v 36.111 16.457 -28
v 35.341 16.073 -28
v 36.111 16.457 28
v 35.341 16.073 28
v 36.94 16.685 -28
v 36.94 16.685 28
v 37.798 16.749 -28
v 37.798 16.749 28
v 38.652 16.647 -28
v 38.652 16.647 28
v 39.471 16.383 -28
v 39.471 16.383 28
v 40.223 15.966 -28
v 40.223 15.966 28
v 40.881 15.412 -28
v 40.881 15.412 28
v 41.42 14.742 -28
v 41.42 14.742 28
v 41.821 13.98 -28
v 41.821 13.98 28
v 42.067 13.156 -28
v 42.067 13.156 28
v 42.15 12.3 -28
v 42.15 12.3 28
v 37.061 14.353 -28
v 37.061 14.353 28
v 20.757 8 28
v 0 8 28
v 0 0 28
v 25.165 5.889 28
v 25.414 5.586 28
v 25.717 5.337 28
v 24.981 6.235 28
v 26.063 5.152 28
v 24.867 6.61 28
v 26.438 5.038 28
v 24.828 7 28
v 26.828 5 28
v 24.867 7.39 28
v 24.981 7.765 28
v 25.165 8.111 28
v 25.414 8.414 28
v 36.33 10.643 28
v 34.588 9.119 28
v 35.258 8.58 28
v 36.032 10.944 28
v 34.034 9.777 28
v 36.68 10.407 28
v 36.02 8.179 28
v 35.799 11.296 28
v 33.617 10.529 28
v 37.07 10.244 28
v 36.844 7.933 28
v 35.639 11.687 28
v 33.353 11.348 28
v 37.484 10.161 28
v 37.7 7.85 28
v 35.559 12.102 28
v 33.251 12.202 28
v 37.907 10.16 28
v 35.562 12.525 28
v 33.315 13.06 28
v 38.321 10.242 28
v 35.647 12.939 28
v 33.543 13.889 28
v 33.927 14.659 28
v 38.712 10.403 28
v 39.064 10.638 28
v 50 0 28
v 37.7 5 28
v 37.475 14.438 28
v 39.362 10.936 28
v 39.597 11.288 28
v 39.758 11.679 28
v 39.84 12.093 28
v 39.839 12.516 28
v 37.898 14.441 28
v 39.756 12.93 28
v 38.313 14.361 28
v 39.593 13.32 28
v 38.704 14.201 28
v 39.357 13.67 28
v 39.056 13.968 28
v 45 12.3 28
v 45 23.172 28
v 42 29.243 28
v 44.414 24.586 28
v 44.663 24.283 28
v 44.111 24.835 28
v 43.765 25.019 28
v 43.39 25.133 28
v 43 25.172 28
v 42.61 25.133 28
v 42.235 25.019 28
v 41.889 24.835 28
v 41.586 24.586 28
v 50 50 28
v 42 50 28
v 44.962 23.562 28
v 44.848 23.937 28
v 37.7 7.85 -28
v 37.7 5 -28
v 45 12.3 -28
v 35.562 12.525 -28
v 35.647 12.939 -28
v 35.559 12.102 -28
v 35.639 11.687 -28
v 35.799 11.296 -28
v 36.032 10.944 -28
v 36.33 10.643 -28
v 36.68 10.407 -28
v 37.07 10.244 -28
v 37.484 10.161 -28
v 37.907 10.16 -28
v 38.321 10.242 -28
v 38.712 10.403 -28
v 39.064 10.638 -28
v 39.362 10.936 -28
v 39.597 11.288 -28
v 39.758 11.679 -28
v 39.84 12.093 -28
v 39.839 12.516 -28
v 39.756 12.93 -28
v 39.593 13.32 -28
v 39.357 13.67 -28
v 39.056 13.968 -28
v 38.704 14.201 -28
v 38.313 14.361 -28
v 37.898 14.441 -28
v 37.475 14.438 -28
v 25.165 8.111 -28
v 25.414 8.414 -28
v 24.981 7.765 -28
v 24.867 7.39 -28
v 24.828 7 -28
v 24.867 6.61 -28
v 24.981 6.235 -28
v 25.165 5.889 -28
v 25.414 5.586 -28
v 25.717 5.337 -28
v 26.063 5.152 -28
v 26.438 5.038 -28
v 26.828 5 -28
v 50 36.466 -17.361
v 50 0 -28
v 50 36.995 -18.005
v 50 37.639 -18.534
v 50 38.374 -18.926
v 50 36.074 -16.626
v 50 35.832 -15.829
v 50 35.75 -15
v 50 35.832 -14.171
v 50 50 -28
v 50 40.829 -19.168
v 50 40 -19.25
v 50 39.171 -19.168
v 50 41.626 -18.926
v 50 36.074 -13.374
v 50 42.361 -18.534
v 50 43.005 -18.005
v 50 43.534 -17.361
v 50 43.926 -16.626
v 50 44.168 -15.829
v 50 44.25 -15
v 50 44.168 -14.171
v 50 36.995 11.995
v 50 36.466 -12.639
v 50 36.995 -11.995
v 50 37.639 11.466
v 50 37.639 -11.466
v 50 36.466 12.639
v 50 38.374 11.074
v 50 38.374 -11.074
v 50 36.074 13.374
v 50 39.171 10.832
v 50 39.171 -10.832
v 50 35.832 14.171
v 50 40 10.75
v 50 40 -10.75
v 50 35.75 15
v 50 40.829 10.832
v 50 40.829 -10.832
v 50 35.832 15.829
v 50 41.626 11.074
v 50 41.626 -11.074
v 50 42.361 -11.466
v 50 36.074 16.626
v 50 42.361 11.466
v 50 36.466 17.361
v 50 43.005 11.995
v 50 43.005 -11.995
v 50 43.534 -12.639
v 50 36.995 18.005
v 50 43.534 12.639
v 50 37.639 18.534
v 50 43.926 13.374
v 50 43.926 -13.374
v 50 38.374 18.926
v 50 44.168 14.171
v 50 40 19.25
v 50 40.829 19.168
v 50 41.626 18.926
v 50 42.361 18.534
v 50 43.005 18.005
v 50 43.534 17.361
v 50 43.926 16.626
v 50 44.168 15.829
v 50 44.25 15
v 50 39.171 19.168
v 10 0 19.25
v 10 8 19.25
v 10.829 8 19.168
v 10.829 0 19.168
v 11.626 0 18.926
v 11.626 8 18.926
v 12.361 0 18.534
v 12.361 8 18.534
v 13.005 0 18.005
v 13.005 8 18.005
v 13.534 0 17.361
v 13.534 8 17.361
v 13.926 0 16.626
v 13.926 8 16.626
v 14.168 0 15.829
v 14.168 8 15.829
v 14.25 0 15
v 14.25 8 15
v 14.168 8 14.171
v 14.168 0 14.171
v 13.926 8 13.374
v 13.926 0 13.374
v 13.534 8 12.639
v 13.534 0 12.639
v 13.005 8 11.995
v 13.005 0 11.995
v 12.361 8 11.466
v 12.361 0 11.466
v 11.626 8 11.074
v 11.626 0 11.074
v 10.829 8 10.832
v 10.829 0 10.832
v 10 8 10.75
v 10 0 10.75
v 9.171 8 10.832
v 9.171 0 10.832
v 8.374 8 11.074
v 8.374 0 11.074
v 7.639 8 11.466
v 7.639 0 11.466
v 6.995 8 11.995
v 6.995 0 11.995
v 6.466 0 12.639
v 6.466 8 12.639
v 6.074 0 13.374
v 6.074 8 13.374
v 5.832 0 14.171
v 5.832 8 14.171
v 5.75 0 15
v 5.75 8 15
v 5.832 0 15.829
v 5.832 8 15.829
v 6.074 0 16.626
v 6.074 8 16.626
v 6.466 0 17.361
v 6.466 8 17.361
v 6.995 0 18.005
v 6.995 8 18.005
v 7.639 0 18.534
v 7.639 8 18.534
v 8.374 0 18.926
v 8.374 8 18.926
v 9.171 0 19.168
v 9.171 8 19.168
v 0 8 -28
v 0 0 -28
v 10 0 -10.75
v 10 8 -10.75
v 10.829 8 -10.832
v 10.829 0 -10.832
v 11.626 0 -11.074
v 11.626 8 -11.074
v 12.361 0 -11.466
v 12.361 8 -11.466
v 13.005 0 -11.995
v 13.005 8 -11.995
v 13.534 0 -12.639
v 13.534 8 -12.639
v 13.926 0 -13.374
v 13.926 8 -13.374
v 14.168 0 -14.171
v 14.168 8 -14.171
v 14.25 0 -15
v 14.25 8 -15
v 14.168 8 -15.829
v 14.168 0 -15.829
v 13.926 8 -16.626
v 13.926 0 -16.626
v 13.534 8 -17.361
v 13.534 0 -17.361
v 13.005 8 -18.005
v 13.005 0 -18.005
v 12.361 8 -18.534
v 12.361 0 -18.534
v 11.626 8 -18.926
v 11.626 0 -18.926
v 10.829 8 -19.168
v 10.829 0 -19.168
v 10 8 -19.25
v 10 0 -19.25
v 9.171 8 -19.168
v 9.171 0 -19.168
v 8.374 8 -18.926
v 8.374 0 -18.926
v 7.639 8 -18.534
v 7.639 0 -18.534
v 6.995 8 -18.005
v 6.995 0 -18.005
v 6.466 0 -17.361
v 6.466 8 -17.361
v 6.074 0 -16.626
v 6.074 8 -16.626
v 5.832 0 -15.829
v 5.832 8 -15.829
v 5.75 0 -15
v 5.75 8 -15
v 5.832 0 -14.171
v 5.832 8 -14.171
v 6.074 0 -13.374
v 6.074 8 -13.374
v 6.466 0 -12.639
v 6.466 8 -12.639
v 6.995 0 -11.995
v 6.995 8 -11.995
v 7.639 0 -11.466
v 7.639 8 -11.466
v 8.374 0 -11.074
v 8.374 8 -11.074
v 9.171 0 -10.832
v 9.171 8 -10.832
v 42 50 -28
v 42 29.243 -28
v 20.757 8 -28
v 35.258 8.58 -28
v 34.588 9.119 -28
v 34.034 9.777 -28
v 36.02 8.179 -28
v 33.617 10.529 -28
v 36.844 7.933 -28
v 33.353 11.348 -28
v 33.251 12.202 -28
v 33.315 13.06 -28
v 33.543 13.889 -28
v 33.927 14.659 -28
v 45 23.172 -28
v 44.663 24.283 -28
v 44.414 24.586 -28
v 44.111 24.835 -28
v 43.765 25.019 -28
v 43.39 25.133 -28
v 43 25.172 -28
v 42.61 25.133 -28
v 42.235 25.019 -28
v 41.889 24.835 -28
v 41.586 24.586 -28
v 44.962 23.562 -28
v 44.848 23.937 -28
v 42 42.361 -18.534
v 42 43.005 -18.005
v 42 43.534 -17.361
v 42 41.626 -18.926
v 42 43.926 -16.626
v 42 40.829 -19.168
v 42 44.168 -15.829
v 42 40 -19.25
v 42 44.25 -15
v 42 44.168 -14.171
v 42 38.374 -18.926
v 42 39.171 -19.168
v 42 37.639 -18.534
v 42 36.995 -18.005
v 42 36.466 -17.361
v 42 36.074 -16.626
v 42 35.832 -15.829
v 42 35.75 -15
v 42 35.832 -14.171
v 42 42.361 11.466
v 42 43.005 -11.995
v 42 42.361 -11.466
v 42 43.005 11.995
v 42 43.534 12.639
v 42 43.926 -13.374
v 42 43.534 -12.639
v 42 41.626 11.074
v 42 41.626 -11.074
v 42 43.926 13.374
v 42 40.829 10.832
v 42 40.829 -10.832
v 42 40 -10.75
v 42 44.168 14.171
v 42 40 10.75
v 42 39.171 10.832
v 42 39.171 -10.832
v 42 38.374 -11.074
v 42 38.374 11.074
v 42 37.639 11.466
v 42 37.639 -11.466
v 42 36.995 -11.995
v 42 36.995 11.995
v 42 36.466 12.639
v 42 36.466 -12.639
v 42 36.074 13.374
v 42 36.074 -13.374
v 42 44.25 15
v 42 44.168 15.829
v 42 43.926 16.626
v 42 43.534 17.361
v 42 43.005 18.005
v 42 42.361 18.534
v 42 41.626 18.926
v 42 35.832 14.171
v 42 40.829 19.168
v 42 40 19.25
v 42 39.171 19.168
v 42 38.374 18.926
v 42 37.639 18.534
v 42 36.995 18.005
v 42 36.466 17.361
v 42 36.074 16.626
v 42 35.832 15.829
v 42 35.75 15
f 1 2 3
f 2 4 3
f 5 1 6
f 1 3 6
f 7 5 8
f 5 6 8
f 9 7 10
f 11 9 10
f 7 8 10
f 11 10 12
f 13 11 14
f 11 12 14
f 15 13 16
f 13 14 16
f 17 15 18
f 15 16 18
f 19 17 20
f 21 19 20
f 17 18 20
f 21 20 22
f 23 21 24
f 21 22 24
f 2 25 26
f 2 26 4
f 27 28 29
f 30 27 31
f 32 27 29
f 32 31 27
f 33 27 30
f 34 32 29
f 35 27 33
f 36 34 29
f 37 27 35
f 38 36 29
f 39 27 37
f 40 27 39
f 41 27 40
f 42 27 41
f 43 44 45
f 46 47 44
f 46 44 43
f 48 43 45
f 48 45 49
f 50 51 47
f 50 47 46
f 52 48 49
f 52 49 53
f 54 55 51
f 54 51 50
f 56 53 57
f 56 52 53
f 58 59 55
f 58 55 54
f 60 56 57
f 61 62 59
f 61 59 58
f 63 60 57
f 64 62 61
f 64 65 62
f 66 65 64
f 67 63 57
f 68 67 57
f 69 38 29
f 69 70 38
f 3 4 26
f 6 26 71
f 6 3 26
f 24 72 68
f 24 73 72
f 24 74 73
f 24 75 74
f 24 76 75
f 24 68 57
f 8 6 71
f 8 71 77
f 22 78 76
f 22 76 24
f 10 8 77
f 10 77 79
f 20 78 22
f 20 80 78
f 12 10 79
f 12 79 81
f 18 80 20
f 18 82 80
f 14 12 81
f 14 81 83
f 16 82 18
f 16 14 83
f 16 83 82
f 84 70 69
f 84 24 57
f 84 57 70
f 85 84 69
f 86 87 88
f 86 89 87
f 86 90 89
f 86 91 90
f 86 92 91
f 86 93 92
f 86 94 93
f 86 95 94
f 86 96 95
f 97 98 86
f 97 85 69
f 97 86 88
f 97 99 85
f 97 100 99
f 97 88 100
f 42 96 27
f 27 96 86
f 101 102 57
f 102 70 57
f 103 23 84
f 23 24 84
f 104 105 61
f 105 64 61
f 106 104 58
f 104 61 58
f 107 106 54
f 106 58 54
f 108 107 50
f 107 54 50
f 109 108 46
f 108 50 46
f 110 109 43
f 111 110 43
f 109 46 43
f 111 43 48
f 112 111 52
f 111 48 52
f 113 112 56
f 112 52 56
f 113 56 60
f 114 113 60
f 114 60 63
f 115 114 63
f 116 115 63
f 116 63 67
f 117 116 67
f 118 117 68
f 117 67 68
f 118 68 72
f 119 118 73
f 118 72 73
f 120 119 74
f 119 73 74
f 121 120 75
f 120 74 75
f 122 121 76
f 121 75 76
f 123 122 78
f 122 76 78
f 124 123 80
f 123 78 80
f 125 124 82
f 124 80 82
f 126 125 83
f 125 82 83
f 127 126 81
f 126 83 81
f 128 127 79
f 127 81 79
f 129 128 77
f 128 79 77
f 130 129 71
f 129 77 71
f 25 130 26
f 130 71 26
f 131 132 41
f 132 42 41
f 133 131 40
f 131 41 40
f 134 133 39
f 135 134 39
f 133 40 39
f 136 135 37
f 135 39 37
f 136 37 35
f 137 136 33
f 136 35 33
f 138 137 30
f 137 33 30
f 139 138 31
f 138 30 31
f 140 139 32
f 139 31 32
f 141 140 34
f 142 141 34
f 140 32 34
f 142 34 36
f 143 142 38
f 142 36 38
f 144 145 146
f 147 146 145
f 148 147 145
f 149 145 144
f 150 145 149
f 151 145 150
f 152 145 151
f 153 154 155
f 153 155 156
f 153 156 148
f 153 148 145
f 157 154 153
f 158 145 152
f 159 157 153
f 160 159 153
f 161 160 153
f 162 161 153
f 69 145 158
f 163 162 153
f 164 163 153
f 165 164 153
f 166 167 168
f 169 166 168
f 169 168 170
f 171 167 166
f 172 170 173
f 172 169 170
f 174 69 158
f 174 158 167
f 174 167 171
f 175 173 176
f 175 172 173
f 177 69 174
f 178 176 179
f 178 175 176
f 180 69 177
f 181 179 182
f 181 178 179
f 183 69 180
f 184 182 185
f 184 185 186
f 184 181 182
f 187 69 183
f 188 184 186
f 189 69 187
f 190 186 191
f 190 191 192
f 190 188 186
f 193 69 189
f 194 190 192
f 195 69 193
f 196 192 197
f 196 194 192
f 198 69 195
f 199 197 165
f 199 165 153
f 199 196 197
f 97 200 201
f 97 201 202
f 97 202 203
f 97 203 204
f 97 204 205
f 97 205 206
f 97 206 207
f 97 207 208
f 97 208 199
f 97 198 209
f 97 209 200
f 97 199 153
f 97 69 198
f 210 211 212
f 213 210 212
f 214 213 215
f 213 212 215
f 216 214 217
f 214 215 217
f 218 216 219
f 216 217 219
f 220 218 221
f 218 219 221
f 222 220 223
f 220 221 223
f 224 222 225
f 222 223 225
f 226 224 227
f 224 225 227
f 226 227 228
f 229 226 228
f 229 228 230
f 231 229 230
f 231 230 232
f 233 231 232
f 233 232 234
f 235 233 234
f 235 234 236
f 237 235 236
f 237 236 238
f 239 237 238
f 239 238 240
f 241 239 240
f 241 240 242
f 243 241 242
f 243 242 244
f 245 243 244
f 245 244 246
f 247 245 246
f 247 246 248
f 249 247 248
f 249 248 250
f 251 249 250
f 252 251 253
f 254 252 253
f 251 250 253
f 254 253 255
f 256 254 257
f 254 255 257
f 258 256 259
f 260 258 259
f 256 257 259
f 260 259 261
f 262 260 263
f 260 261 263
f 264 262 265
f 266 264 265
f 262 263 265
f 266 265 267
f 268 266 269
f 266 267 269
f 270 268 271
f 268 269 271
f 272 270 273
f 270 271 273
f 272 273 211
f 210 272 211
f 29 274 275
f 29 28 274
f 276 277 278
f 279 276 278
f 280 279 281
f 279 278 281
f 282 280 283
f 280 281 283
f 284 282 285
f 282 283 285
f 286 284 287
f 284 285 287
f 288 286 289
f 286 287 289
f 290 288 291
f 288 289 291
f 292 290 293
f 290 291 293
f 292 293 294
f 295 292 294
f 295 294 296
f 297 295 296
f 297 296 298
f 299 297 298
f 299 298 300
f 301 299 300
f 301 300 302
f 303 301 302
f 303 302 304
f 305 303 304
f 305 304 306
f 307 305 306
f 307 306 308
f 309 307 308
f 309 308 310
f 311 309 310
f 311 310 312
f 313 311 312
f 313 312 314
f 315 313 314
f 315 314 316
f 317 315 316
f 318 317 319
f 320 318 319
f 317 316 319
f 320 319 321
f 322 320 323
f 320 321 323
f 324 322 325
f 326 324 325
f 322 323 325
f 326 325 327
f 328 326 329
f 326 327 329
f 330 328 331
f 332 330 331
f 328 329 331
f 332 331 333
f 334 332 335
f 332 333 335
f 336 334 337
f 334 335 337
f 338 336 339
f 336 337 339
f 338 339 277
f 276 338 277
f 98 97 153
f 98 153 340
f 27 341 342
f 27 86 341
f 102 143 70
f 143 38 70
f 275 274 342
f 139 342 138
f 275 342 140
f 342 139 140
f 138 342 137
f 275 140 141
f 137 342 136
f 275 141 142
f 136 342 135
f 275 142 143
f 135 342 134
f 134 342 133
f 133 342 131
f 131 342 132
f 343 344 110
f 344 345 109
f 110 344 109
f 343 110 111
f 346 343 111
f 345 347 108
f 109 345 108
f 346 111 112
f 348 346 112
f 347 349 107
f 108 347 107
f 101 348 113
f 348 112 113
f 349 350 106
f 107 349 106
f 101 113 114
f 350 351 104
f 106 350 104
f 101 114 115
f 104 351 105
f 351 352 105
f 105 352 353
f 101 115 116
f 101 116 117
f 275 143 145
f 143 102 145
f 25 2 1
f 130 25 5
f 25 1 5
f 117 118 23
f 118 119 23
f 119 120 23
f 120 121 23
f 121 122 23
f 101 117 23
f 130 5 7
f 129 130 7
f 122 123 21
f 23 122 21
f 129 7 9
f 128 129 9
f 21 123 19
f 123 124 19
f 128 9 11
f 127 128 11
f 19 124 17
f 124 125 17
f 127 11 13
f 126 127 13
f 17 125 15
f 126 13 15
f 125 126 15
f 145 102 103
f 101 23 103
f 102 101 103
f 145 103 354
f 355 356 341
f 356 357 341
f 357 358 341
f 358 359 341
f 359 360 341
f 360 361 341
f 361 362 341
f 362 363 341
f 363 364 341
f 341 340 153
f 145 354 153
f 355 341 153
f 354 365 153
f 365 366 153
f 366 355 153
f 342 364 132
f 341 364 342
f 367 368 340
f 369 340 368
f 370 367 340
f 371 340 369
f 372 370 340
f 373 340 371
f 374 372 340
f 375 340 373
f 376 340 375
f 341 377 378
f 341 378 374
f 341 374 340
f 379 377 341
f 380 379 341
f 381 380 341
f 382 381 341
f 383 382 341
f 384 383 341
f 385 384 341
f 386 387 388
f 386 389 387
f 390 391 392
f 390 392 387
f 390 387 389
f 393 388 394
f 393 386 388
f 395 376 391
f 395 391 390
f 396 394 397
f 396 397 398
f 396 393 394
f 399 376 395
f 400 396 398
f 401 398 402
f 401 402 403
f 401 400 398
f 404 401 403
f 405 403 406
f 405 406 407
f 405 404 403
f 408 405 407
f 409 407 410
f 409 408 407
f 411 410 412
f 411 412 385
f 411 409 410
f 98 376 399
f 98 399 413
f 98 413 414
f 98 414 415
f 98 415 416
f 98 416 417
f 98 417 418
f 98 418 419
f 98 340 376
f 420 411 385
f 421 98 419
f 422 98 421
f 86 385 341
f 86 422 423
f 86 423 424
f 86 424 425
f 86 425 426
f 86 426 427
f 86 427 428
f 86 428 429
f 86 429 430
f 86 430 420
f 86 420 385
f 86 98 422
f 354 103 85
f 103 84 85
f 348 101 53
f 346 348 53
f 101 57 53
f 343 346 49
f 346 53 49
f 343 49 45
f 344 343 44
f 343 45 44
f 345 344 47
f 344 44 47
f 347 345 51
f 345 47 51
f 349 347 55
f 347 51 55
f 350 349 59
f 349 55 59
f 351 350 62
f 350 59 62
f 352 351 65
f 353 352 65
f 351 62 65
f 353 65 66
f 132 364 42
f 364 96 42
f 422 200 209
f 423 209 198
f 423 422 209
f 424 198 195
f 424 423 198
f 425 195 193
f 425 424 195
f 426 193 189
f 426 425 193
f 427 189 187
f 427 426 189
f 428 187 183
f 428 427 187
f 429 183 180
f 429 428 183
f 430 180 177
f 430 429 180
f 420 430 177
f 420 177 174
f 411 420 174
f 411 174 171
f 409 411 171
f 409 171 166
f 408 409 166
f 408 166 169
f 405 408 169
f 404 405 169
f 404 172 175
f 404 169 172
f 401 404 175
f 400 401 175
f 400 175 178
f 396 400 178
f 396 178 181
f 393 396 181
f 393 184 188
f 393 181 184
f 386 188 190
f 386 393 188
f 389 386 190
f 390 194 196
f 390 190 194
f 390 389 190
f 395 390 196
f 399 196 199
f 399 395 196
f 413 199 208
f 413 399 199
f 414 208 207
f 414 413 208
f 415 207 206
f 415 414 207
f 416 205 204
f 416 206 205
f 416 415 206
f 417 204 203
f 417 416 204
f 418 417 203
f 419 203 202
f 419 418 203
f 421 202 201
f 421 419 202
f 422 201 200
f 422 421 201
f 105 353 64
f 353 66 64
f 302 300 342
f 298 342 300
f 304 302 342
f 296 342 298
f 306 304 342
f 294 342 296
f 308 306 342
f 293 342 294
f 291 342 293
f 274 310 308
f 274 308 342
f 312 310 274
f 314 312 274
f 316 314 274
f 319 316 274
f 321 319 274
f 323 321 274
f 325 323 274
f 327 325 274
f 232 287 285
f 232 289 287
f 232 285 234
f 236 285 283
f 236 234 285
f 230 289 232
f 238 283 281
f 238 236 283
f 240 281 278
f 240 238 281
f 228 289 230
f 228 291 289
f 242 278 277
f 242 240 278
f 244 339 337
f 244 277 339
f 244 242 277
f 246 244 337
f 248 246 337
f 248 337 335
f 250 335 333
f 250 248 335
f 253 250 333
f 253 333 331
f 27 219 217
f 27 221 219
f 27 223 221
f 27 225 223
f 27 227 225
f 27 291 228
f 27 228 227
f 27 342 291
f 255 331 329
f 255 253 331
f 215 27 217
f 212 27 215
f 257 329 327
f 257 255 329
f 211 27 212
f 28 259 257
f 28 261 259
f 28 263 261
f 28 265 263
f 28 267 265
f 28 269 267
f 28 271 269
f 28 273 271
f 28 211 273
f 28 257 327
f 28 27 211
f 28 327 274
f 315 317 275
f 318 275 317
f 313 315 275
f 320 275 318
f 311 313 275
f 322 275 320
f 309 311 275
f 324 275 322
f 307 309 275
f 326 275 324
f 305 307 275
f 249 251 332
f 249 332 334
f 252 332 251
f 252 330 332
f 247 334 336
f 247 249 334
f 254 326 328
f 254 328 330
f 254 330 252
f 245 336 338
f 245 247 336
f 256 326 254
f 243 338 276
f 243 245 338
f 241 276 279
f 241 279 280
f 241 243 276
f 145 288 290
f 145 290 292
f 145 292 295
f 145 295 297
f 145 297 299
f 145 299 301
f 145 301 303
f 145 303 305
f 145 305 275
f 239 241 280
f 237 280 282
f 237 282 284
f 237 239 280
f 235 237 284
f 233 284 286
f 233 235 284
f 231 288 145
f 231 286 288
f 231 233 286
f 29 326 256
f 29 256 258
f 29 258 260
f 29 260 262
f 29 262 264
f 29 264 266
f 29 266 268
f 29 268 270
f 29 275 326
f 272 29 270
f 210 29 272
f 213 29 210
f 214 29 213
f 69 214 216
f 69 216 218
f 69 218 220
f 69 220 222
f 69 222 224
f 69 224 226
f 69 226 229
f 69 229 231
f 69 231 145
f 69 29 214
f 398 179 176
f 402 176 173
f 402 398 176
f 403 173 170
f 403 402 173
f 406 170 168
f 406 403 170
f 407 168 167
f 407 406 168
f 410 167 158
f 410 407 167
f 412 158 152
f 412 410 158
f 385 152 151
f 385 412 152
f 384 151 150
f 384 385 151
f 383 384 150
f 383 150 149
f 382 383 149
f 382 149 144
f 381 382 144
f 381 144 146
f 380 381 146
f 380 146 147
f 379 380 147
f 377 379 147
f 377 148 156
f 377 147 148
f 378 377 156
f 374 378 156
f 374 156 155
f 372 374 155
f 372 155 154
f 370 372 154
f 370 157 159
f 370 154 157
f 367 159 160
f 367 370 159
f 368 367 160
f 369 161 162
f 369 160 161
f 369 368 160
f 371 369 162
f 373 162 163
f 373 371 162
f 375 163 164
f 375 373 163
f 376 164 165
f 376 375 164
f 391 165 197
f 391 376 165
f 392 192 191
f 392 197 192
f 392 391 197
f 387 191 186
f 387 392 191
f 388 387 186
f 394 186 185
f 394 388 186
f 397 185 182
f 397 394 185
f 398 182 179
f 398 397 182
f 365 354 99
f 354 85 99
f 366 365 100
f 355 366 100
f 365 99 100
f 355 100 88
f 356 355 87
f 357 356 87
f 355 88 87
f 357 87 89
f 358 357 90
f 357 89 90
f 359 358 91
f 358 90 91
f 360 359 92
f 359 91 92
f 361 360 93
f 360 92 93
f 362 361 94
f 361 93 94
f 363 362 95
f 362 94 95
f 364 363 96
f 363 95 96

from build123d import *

# Parameters (mm, degrees)
EXTRUDE_1_DEPTH     = 28
SKETCH_3_R          = 4.25
CUT_EXTRUDE_1_DEPTH = 56


with BuildPart() as part:
    # 草图1 → 凸台-拉伸1 (new, symmetric)
    with BuildSketch(Plane.XY):
        Polygon((0, 0), (50, 0), (50, 50), (42, 50), (42, 29.242640687), (20.757359313, 8), (0, 8), align=None)
        with BuildLine():
            Line((37.061279898, 14.352933665), (35.340960992, 16.07325257))
            ThreePointArc((35.340960992, 16.07325257), (39.856939547, 16.192314452), (42.15, 12.3))
            Line((42.15, 12.3), (45, 12.3))
            Line((45, 12.3), (45, 23.171572875))
            ThreePointArc((45, 23.171572875), (43.765366865, 25.01933194), (41.585786438, 24.585786438))
            Line((41.585786438, 24.585786438), (25.414213562, 8.414213562))
            ThreePointArc((25.414213562, 8.414213562), (24.98066806, 6.234633135), (26.828427125, 5))
            Line((26.828427125, 5), (37.7, 5))
            Line((37.7, 5), (37.7, 7.85))
            ThreePointArc((37.7, 7.85), (33.807685548, 10.143060453), (33.92674743, 14.659039008))
            Line((33.92674743, 14.659039008), (35.647066335, 12.938720102))
            ThreePointArc((35.647066335, 12.938720102), (39.22027958, 10.77972042), (37.061279898, 14.352933665))
        make_face(mode=Mode.SUBTRACT)
    extrude(amount=EXTRUDE_1_DEPTH, both=True)

    # 草图3 → 切除-拉伸1 (cut)
    with BuildSketch(Plane(origin=(0, 8, 0), x_dir=(1, 0, 0), z_dir=(0, 1, 0))):
        with Locations(Location((10, 15, 0), (0, 0, 270))):
            Circle(SKETCH_3_R)
        with Locations(Location((10, -15, 0), (0, 0, 270))):
            Circle(SKETCH_3_R)
    cut_extrude_1 = extrude(amount=-CUT_EXTRUDE_1_DEPTH, mode=Mode.SUBTRACT)

    # 镜向1: 切除-拉伸1 across plane
    add(cut_extrude_1.mirror(Plane(origin=(25, 25, 0), x_dir=(0, 0, 1), z_dir=(-0.7071067811865486, -0.7071067811865465, 0))), mode=Mode.SUBTRACT)


solid = part.part
